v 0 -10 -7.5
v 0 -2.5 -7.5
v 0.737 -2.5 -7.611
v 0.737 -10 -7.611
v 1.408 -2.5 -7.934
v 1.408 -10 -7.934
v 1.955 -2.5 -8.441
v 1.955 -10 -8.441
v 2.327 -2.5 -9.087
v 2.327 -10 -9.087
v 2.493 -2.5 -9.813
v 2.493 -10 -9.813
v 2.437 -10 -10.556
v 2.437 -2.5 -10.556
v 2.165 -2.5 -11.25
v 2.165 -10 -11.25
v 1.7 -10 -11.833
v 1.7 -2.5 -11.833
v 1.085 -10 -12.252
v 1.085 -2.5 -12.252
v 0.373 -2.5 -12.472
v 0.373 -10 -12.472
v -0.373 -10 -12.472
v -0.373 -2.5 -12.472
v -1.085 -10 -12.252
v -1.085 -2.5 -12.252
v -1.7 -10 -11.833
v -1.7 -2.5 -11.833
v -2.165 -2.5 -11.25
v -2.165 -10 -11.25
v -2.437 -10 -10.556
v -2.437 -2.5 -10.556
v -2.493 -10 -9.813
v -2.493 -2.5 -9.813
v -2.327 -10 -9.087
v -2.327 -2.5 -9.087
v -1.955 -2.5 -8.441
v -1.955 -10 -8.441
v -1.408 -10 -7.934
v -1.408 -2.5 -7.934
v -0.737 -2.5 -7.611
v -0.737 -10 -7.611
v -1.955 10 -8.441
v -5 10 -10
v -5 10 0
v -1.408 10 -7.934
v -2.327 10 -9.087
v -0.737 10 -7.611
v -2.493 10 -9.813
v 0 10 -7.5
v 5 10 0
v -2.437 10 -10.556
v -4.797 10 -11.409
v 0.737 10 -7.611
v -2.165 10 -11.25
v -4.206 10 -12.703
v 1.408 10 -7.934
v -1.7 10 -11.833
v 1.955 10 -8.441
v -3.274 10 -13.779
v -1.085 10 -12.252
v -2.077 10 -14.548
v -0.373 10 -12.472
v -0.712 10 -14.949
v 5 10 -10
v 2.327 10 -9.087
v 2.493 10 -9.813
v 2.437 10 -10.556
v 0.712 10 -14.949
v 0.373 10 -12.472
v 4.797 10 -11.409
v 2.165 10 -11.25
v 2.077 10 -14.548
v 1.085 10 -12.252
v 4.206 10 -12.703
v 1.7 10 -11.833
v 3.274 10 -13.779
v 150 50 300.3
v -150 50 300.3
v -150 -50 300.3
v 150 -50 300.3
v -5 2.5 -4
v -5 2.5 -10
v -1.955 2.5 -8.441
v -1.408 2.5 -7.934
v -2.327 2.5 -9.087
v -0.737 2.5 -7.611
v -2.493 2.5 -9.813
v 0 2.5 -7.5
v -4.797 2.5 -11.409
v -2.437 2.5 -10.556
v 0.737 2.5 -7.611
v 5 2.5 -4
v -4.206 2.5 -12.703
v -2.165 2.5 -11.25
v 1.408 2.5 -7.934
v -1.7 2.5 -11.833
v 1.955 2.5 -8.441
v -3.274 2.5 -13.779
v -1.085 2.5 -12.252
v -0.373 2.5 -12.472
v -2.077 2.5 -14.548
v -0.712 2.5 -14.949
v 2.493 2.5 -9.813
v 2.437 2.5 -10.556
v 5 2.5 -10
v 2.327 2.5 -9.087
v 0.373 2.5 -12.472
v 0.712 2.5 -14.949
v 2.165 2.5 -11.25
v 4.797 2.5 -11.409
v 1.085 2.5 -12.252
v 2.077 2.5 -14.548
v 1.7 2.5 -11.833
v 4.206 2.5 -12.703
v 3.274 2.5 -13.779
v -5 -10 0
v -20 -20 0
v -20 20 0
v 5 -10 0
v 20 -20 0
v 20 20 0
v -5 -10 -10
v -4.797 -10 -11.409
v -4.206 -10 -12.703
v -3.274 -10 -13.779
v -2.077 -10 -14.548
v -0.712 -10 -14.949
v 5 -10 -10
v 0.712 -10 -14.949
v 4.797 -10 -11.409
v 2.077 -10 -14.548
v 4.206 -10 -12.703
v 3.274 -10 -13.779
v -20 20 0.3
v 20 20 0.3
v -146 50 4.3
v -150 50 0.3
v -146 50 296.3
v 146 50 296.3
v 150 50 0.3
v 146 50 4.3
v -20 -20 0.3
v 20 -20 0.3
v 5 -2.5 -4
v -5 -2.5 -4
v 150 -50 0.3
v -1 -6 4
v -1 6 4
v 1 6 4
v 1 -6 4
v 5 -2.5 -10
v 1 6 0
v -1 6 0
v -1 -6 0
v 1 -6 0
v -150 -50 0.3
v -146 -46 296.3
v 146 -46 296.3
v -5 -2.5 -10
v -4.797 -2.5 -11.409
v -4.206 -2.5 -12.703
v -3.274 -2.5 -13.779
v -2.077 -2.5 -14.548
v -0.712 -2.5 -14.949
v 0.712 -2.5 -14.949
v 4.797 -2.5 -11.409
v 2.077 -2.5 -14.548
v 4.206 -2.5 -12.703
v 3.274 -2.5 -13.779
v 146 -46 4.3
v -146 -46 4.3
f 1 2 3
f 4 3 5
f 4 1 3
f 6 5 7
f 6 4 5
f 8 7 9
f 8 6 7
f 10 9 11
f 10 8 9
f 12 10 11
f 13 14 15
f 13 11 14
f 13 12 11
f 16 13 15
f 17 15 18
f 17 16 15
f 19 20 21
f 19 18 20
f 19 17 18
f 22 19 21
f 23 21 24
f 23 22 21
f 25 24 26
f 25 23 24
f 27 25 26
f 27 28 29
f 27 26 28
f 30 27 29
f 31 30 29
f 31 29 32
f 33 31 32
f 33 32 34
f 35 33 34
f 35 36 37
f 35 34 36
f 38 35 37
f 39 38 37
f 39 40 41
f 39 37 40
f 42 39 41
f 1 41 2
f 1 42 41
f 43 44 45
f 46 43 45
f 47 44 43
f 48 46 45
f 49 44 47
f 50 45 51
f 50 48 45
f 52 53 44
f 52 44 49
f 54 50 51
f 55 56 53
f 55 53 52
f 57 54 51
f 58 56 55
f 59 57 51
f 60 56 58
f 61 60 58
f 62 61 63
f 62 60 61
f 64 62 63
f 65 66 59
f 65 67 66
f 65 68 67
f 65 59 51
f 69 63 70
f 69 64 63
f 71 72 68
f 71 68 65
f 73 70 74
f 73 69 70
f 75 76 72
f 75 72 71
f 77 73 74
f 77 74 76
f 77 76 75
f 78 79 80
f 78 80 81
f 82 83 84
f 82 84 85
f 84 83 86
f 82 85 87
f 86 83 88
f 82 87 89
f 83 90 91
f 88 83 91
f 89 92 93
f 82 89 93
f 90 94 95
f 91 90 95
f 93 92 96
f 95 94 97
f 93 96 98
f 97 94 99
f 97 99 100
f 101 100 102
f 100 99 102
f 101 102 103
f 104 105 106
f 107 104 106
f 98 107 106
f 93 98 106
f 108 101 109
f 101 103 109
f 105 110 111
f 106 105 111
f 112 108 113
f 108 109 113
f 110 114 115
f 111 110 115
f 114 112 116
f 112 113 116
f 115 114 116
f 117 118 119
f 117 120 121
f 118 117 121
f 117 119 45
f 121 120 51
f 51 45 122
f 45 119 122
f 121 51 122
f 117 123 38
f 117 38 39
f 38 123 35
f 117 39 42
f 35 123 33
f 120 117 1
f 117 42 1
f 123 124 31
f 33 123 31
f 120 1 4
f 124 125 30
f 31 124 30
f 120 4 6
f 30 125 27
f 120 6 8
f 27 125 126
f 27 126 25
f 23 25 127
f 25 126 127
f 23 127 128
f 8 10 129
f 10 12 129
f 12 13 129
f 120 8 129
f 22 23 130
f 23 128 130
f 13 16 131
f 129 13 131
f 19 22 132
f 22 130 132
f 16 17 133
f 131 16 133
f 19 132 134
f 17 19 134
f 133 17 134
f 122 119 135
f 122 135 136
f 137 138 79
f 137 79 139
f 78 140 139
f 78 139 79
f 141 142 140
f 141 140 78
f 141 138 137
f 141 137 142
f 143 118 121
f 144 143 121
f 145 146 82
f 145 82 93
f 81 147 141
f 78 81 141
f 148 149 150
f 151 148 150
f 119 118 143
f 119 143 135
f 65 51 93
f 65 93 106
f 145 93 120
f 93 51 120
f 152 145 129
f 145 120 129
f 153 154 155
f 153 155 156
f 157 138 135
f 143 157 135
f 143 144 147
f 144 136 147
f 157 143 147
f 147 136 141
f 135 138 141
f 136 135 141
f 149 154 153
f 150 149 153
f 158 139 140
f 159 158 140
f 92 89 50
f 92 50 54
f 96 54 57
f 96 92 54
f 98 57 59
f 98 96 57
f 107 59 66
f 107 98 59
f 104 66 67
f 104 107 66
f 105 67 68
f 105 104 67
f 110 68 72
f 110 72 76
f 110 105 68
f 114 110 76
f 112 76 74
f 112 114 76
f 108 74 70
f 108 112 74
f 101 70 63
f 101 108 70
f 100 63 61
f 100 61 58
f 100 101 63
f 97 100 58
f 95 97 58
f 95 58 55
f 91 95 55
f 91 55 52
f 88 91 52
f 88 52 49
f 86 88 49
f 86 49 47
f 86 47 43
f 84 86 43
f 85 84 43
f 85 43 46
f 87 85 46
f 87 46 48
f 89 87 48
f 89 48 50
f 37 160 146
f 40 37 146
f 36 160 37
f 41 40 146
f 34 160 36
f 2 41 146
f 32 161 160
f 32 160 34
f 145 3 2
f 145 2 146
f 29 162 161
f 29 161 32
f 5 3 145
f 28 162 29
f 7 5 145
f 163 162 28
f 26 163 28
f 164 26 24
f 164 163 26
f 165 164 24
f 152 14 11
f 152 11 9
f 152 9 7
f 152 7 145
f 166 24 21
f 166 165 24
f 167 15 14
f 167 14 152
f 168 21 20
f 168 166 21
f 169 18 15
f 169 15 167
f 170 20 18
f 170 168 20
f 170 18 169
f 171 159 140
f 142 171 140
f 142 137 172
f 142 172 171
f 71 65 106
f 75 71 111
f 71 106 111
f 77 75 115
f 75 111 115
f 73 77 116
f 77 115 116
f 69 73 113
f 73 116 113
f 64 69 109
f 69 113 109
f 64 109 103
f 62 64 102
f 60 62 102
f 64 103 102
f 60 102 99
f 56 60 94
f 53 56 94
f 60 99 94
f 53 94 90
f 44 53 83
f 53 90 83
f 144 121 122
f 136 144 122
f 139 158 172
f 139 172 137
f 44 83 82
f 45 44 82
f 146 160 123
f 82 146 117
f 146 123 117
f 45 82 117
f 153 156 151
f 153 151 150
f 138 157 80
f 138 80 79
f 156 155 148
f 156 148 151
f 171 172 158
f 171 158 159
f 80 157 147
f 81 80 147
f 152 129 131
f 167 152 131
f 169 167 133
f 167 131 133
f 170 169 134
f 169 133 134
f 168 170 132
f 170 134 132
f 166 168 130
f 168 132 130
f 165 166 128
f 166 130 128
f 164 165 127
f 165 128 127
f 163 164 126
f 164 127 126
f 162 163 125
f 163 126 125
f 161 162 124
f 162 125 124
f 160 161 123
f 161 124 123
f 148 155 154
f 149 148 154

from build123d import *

# Parameters (mm, degrees)
CROQUIS1_W                   = 40
CROQUIS1_H                   = 40
SALIENTE_EXTRUIR1_DEPTH      = 0.3
SALIENTE_EXTRUIR2_DEPTH      = 10
SALIENTE_EXTRUIR2_DEPTH_BACK = 10
CROQUIS2_R                   = 2.5
CORTAR_EXTRUIR1_DEPTH        = 2.5
CORTAR_EXTRUIR1_DEPTH_BACK   = 2.5
CROQUIS3_W                   = 14.056155144
CROQUIS3_H                   = 12
CROQUIS4_W                   = 300
CROQUIS4_H                   = 100
SALIENTE_EXTRUIR3_DEPTH      = 300
VACIADO2_START               = 4.3
VACIADO2_OUTLINE_W           = 292
VACIADO2_OUTLINE_H           = 96
VACIADO2_DEPTH               = 292
VACIADO2_START_2             = 4
VACIADO2_2_OUTLINE_W         = 32
VACIADO2_2_OUTLINE_H         = 32
VACIADO2_2_DEPTH             = 0.3
VACIADO2_3_OUTLINE_W         = 2
VACIADO2_3_OUTLINE_H         = 12
VACIADO2_3_DEPTH             = 4
CROQUIS6_W                   = 32
CROQUIS6_H                   = 32
SALIENTE_EXTRUIR4_DEPTH      = 0.3


with BuildPart() as part:
    # Croquis1 → Saliente-Extruir1 (new body)
    with BuildSketch(Plane.XY):
        Rectangle(CROQUIS1_W, CROQUIS1_H)
    extrude(amount=SALIENTE_EXTRUIR1_DEPTH)

    # Croquis2 → Saliente-Extruir2 (add, two sides: drawn at the far end of the back side and taken through both)
    with BuildSketch(Plane(origin=(0, 0, 0), x_dir=(1, 0, 0), z_dir=(0, 1, 0)).offset(-SALIENTE_EXTRUIR2_DEPTH_BACK)):
        with BuildLine():
            Line((-5, 10), (-5, 0))
            Line((-5, 0), (5, 0))
            Line((5, 0), (5, 10))
            ThreePointArc((5, 10), (0, 15), (-5, 10))
        make_face()
        with Locations(Location((0, 10, 0), (0, 0, 270))):
            Circle(CROQUIS2_R, mode=Mode.SUBTRACT)
    extrude(amount=SALIENTE_EXTRUIR2_DEPTH + SALIENTE_EXTRUIR2_DEPTH_BACK)

    # Croquis3 → Cortar-Extruir1 (cut, two sides: drawn at the far end of the back side and taken through both)
    with BuildSketch(Plane(origin=(0, 0, 0), x_dir=(1, 0, 0), z_dir=(0, 1, 0)).offset(-CORTAR_EXTRUIR1_DEPTH_BACK)):
        with Locations((0, 10)):
            Rectangle(CROQUIS3_W, CROQUIS3_H)
    extrude(amount=CORTAR_EXTRUIR1_DEPTH + CORTAR_EXTRUIR1_DEPTH_BACK, mode=Mode.SUBTRACT)

    # Croquis4 → Saliente-Extruir3 (add)
    with BuildSketch(Plane.XY.offset(0.3)):
        Rectangle(CROQUIS4_W, CROQUIS4_H)
    extrude(amount=SALIENTE_EXTRUIR3_DEPTH)

    # Vaciado2: read off the stored shape, not the designer's step
    # Vaciado2 outline → Vaciado2 (cut)
    with BuildSketch(Plane.XY.offset(VACIADO2_START)):
        with Locations((0, 2)):
            Rectangle(VACIADO2_OUTLINE_W, VACIADO2_OUTLINE_H)
    extrude(amount=VACIADO2_DEPTH, mode=Mode.SUBTRACT)

    # Vaciado2 2 outline → Vaciado2 2 (cut)
    with BuildSketch(Plane.XY.offset(VACIADO2_START_2)):
        Rectangle(VACIADO2_2_OUTLINE_W, VACIADO2_2_OUTLINE_H)
    extrude(amount=VACIADO2_2_DEPTH, mode=Mode.SUBTRACT)

    # Vaciado2 3 outline → Vaciado2 3 (cut)
    with BuildSketch(Plane.XY):
        Rectangle(VACIADO2_3_OUTLINE_W, VACIADO2_3_OUTLINE_H)
    extrude(amount=VACIADO2_3_DEPTH, mode=Mode.SUBTRACT)

    # Croquis6 → Saliente-Extruir4 (add)
    with BuildSketch(Plane.XY.offset(4)):
        Rectangle(CROQUIS6_W, CROQUIS6_H)
    extrude(amount=SALIENTE_EXTRUIR4_DEPTH)


solid = part.part
